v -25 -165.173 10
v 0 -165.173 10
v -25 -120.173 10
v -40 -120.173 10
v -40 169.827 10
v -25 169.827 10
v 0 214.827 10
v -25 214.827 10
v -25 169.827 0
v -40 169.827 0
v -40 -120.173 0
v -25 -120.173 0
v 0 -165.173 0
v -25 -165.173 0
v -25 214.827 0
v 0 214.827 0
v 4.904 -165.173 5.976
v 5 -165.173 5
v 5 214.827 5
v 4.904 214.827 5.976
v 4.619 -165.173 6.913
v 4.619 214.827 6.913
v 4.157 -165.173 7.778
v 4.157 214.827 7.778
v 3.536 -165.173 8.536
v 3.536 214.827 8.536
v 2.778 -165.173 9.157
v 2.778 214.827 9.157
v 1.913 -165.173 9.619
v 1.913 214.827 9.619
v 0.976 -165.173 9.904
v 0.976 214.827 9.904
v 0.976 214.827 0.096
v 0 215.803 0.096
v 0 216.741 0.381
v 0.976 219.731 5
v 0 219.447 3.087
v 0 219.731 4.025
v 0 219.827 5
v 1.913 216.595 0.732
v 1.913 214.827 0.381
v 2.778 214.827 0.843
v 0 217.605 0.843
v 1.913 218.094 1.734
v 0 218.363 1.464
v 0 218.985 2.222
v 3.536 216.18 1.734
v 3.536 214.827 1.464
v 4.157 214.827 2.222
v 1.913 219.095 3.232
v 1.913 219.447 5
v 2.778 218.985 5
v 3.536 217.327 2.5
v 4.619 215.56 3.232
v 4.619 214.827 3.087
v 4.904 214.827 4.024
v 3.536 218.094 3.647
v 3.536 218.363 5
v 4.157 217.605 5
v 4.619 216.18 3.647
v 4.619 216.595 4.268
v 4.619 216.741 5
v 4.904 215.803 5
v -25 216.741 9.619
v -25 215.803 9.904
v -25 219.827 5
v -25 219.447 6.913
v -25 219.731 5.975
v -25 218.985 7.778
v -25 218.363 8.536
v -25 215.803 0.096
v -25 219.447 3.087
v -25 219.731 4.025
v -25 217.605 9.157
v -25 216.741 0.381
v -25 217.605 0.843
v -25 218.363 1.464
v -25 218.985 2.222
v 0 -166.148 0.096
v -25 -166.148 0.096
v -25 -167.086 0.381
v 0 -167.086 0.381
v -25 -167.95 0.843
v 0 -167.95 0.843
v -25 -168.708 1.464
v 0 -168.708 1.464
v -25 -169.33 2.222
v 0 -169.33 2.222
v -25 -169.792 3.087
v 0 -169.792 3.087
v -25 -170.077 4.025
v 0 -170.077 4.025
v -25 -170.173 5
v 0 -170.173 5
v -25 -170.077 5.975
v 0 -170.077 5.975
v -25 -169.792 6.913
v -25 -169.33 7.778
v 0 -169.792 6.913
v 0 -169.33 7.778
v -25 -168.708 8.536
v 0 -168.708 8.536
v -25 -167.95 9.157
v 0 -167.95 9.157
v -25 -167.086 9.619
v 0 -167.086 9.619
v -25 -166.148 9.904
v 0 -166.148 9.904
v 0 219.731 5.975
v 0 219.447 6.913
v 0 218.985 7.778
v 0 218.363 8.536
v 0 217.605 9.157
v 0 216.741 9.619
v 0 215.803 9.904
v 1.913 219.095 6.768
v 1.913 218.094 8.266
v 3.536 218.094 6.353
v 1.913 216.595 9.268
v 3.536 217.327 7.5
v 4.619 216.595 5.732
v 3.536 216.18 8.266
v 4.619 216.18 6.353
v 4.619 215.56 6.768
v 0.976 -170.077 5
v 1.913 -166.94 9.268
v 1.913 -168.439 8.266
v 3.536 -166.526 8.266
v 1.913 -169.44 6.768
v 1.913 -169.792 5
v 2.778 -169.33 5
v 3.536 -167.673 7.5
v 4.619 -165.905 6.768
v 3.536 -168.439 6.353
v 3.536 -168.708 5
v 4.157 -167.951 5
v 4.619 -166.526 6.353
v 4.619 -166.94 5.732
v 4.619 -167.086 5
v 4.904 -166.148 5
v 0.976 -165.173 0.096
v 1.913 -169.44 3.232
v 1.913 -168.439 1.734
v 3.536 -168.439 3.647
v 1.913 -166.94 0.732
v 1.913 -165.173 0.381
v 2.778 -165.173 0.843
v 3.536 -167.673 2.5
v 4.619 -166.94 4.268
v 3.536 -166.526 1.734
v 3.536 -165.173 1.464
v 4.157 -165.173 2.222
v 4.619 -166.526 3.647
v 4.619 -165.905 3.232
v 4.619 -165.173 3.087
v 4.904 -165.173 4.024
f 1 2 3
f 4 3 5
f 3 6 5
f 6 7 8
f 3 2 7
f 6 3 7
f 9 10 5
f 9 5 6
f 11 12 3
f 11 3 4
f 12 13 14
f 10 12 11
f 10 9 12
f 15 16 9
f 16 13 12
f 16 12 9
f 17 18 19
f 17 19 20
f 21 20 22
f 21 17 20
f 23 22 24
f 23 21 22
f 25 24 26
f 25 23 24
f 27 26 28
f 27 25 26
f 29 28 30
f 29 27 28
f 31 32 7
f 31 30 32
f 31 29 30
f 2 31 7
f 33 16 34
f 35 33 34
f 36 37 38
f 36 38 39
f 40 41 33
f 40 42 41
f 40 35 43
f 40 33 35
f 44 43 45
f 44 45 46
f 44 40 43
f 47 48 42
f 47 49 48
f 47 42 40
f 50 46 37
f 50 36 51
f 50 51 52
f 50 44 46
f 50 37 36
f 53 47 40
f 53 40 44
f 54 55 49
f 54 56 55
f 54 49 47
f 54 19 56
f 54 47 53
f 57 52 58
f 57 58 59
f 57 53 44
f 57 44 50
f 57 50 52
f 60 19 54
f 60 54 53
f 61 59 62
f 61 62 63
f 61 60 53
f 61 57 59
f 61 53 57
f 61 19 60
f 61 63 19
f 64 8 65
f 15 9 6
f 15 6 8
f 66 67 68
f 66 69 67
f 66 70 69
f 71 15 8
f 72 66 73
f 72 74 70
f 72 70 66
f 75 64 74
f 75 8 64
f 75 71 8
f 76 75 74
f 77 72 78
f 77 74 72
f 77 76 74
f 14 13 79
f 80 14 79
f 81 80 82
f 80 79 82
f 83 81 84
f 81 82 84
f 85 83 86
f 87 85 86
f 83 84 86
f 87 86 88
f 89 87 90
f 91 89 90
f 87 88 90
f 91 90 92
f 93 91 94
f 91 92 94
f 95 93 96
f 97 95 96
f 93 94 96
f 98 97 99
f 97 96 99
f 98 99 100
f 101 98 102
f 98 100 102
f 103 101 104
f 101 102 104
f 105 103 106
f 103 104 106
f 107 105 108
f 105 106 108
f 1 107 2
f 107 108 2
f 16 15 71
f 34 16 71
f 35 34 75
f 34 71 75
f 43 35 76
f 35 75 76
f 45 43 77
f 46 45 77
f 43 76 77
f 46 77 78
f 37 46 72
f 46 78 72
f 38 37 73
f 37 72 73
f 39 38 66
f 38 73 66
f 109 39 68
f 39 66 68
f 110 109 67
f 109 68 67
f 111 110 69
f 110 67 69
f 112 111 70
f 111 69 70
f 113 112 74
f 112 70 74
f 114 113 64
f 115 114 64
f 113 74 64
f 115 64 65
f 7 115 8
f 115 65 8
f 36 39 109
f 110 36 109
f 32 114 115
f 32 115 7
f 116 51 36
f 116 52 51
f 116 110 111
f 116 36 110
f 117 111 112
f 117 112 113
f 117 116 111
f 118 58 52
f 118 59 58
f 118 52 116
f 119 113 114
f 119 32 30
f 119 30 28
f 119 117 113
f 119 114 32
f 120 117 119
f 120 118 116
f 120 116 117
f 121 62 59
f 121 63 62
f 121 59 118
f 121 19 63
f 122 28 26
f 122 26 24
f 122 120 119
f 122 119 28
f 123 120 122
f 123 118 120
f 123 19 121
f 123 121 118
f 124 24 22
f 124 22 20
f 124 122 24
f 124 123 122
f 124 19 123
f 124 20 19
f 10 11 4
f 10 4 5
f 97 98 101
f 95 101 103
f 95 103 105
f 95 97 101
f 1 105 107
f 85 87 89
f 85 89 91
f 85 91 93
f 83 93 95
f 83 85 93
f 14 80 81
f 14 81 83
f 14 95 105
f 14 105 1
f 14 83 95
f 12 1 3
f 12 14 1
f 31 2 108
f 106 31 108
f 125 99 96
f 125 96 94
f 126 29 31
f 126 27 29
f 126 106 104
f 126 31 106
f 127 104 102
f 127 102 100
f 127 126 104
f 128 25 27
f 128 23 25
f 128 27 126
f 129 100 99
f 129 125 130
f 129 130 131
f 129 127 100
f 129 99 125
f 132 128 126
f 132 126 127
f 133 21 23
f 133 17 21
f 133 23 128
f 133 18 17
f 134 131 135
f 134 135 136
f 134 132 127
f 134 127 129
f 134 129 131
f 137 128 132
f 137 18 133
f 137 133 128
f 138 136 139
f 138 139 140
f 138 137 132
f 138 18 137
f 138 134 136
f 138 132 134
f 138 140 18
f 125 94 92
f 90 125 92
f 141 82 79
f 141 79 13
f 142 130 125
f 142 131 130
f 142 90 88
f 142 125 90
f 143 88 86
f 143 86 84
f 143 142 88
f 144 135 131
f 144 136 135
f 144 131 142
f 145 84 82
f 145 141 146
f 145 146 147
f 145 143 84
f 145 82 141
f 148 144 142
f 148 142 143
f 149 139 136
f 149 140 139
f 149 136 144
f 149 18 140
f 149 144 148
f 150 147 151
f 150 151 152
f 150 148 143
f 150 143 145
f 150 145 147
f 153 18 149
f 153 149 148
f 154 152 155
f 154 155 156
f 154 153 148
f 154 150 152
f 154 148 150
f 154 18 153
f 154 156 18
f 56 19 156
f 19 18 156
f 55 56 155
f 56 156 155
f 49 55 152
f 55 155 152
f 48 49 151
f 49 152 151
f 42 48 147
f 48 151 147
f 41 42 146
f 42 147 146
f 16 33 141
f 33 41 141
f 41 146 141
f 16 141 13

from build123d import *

# Parameters (mm, degrees)
BOSS_EXTRUDE1_DEPTH = 10
FILLET1_R           = 5
FILLET2_R           = 5
FILLET3_R           = 5


# Some blends are built 0.0001 mm under size
with BuildPart() as part:
    # Sketch1 → Boss-Extrude1 (new body)
    with BuildSketch(Plane.XY):
        Polygon((-40, -120.172625832), (-40, 169.827374168), (-25, 169.827374168), (-25, 219.827374168), (5, 219.827374168), (5, -170.172625832), (-25, -170.172625832), (-25, -120.172625832), align=None)
    extrude(amount=BOSS_EXTRUDE1_DEPTH)

    # Fillet1
    fillet1_edges = [part.edges().sort_by_distance(p)[0] for p in [
        (5, 24.827374168, 10),
        (5, 219.827374168, 5),
        (5, -170.172625832, 5),
        (5, 24.827374168, 0),
    ]]
    fillet(fillet1_edges, radius=FILLET1_R - 0.0001)  # a hair under: the kernel refuses the full size

    # Fillet2
    # the kernel refuses this fillet: 5 mm, written as the material it takes off along each edge
    with BuildSketch(Plane(origin=(5, -165.172625832, 5), x_dir=(0, -1, 0), z_dir=(0, 0, 1))) as fillet2_piece_1:
        with BuildLine():
            CenterArc((0.0001, -4.9999), 4.9999, 0, 90)
            Line((5, -4.9999), (5, 0))
            Line((5, 0), (0.0001, 0))
        make_face()
    revolve(axis=Axis((5, -165.172625832, 5), (1, 0, 0)), revolution_arc=90, mode=Mode.SUBTRACT)
    with BuildSketch(Plane(origin=(5, -165.172625832, 5), x_dir=(0, 0, 1), z_dir=(0, 1, 0))) as fillet2_piece_2:
        with BuildLine():
            CenterArc((0.0001, -4.9999), 4.9999, 0, 90)
            Line((5, -4.9999), (5, 0))
            Line((5, 0), (0.0001, 0))
        make_face()
    revolve(axis=Axis((5, -165.172625832, 5), (1, 0, 0)), revolution_arc=90, mode=Mode.SUBTRACT)
    with BuildSketch(Plane(origin=(5, -170.172625832, 0), x_dir=(0, 1, 0), z_dir=(-1, 0, 0))) as fillet2_piece_3:
        with BuildLine():
            CenterArc((FILLET2_R, -FILLET2_R), FILLET2_R, 90, 90)
            Line((0, -FILLET2_R), (0, 0))
            Line((0, 0), (FILLET2_R, 0))
        make_face()
    extrude(amount=42.5, mode=Mode.SUBTRACT)
    with BuildSketch(Plane(origin=(5, -170.172625832, 10), x_dir=(0, 1, 0), z_dir=(-1, 0, 0))) as fillet2_piece_4:
        with BuildLine():
            CenterArc((FILLET2_R, FILLET2_R), FILLET2_R, 180, 90)
            Line((0, FILLET2_R), (0, 0))
            Line((0, 0), (FILLET2_R, 0))
        make_face()
    extrude(amount=42.5, mode=Mode.SUBTRACT)

    # Fillet3
    # the kernel refuses this fillet: 5 mm, written as the material it takes off along each edge
    with BuildSketch(Plane(origin=(5, 214.827374168, 5), x_dir=(0, 0, -1), z_dir=(0, -1, 0))) as fillet3_piece_1:
        with BuildLine():
            CenterArc((0.0001, -4.9999), 4.9999, 0, 90)
            Line((5, -4.9999), (5, 0))
            Line((5, 0), (0.0001, 0))
        make_face()
    revolve(axis=Axis((5, 214.827374168, 5), (1, 0, 0)), revolution_arc=90, mode=Mode.SUBTRACT)
    with BuildSketch(Plane(origin=(5, 214.827374168, 5), x_dir=(0, 1, 0), z_dir=(0, 0, -1))) as fillet3_piece_2:
        with BuildLine():
            CenterArc((0.0001, -4.9999), 4.9999, 0, 90)
            Line((5, -4.9999), (5, 0))
            Line((5, 0), (0.0001, 0))
        make_face()
    revolve(axis=Axis((5, 214.827374168, 5), (1, 0, 0)), revolution_arc=90, mode=Mode.SUBTRACT)
    with BuildSketch(Plane(origin=(-37.5, 219.827374168, 0), x_dir=(0, 0, 1), z_dir=(1, 0, 0))) as fillet3_piece_3:
        with BuildLine():
            CenterArc((FILLET3_R, FILLET3_R), FILLET3_R, 180, 90)
            Line((0, FILLET3_R), (0, 0))
            Line((0, 0), (FILLET3_R, 0))
        make_face()
    extrude(amount=42.5, mode=Mode.SUBTRACT)
    with BuildSketch(Plane(origin=(-37.5, 219.827374168, 10), x_dir=(0, 0, -1), z_dir=(1, 0, 0))) as fillet3_piece_4:
        with BuildLine():
            CenterArc((FILLET3_R, -FILLET3_R), FILLET3_R, 90, 90)
            Line((0, -FILLET3_R), (0, 0))
            Line((0, 0), (FILLET3_R, 0))
        make_face()
    extrude(amount=42.5, mode=Mode.SUBTRACT)


solid = part.part
